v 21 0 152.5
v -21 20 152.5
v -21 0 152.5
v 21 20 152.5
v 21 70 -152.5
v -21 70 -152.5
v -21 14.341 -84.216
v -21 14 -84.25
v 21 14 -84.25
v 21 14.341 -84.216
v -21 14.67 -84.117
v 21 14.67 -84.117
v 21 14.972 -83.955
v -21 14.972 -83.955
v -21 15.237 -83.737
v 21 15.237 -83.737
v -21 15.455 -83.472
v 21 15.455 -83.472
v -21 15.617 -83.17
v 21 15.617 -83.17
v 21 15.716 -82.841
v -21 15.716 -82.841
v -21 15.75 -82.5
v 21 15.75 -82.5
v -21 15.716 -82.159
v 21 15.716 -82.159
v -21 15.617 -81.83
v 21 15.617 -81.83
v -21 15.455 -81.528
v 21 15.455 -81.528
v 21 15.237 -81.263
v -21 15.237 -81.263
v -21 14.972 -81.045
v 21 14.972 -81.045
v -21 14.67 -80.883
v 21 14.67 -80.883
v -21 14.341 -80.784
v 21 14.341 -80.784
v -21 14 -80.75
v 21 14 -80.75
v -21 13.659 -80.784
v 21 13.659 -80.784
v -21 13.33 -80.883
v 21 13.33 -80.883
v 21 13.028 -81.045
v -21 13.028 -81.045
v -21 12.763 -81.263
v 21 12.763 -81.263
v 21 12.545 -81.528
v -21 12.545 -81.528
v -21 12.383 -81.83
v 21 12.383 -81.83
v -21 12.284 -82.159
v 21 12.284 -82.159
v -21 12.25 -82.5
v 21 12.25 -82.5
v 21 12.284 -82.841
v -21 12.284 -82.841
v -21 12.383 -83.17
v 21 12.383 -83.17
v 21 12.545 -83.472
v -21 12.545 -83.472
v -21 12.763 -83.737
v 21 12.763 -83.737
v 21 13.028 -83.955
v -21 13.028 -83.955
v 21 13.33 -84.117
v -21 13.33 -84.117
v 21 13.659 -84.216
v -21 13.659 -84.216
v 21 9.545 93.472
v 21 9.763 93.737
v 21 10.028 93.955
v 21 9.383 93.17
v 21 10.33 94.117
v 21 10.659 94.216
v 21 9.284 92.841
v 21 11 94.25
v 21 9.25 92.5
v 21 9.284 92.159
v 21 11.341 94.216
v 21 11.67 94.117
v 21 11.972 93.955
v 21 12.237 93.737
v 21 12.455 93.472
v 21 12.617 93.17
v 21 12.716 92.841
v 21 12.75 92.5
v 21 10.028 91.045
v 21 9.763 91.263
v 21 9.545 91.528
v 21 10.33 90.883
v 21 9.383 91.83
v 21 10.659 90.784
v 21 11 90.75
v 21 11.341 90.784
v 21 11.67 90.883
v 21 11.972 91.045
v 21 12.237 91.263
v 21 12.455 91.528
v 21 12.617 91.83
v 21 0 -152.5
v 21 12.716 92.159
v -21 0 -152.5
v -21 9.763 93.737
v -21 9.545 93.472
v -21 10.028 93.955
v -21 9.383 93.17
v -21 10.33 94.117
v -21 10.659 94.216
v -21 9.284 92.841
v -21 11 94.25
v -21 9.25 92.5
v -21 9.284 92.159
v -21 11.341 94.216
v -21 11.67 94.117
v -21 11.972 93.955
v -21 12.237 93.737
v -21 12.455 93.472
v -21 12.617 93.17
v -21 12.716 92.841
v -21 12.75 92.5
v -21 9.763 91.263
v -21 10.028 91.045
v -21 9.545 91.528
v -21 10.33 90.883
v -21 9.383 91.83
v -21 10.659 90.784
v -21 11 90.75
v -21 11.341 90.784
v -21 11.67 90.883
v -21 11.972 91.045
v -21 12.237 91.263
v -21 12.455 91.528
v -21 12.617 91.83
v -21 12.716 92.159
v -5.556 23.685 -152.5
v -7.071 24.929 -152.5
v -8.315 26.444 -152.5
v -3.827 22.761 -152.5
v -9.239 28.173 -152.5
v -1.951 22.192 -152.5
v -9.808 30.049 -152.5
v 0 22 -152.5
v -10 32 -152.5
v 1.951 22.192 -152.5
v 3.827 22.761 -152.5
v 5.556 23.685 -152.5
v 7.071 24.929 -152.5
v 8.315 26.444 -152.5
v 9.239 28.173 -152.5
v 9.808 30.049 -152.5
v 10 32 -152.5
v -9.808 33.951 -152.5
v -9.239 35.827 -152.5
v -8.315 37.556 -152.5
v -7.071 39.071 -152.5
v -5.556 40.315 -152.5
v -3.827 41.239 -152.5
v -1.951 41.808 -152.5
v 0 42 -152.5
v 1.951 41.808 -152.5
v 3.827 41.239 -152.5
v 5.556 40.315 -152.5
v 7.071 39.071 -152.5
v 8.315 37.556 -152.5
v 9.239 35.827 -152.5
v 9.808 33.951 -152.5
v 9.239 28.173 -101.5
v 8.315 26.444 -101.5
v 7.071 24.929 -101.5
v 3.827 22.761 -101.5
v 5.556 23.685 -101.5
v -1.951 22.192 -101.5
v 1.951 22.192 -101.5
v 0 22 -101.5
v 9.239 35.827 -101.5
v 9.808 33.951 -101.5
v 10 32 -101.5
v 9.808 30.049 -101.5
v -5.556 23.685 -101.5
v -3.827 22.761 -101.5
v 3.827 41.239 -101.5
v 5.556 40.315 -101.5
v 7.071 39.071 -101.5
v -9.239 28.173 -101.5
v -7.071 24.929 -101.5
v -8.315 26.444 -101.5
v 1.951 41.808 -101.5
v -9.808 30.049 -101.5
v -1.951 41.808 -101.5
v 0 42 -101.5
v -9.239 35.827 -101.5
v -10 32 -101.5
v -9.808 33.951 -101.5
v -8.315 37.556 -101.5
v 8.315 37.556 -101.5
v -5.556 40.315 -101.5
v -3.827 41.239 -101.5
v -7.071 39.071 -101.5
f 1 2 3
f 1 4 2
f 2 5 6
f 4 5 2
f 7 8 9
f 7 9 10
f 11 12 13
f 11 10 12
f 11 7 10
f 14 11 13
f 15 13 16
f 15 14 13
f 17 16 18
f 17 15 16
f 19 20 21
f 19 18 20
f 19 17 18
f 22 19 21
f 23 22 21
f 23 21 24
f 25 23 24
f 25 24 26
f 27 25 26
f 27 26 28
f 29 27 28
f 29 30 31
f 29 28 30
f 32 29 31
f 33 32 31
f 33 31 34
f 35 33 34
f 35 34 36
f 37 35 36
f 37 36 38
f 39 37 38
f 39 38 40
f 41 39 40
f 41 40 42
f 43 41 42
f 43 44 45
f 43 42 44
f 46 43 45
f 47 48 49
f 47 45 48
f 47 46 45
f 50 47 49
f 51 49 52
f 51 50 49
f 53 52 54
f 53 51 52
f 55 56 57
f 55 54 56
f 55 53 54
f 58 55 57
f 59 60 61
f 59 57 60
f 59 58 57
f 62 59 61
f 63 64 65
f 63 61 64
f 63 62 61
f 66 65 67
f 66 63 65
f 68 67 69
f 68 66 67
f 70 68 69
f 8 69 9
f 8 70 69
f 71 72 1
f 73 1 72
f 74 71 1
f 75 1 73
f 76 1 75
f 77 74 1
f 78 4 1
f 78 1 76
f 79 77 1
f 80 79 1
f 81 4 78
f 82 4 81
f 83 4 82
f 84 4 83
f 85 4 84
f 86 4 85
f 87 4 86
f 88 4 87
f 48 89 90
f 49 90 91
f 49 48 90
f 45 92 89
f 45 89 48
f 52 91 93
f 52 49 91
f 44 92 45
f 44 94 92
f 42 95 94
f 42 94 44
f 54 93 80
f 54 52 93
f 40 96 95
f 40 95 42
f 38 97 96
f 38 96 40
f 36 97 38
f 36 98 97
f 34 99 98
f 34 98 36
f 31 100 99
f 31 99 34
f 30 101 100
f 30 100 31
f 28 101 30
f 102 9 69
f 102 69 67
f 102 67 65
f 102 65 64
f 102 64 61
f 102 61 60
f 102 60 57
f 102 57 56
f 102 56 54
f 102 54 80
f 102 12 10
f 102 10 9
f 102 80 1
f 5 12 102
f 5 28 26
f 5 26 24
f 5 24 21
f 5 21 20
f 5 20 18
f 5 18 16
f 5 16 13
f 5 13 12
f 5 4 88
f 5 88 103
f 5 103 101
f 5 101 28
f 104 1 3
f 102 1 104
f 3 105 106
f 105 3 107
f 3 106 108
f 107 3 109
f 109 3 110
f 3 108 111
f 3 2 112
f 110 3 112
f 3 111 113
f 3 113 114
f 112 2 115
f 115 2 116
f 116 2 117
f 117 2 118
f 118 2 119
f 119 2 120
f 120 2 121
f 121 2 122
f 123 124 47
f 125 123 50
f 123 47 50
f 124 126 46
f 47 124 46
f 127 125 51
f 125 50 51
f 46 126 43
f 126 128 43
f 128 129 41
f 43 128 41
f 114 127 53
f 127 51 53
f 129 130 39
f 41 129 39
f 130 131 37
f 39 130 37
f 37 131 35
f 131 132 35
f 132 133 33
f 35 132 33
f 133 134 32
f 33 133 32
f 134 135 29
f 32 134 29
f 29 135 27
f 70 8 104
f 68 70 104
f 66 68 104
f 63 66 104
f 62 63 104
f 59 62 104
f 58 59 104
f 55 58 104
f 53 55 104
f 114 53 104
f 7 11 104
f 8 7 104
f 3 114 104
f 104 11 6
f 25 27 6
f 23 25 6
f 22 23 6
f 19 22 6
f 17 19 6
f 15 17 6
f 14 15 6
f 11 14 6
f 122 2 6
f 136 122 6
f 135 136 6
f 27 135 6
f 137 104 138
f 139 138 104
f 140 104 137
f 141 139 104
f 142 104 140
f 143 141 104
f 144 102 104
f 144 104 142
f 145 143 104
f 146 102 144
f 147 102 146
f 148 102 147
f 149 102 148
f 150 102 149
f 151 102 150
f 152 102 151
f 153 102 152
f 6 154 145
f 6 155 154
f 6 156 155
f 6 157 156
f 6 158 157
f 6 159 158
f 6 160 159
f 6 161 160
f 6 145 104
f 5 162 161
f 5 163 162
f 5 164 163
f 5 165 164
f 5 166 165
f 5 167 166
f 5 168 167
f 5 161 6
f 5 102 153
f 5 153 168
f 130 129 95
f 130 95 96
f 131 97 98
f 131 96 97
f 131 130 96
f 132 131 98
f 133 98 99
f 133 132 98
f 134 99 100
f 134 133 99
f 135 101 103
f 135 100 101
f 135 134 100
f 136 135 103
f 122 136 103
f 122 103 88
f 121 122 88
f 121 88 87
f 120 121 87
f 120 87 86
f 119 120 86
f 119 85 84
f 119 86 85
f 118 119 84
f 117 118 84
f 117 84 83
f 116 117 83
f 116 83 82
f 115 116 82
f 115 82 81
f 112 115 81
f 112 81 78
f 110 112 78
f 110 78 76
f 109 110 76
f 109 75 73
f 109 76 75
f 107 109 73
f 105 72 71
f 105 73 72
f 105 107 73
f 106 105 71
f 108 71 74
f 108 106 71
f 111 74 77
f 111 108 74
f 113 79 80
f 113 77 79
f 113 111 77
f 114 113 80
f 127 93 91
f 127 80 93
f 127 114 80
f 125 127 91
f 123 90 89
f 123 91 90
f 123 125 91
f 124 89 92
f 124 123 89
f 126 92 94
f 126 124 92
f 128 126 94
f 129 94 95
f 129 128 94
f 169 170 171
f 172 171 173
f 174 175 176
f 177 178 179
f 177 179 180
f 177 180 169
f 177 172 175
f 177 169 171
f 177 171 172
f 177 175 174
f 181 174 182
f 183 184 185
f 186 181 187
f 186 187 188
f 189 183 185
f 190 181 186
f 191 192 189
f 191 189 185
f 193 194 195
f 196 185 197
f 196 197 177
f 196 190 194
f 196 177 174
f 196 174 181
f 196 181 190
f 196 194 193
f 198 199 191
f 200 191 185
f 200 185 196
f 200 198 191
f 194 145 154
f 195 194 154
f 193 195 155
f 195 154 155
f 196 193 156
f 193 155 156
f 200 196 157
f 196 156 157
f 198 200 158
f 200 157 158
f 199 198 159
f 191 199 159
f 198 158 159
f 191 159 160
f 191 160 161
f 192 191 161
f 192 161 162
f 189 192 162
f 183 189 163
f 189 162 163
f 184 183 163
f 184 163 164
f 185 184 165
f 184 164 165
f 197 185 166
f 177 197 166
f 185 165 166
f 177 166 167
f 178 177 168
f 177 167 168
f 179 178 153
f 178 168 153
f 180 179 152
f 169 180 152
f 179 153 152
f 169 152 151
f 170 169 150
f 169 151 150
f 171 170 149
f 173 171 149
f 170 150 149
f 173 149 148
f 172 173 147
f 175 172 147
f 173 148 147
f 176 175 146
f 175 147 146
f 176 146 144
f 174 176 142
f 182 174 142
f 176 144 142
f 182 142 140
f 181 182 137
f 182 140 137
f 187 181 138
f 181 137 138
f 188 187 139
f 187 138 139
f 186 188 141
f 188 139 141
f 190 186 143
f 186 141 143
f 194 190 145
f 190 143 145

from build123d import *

# Parameters (mm, degrees)
STOCK_MATERIAL_DEPTH      = 21
SKETCH2_R                 = 10
POWER_PLANT_CHAMBER_DEPTH = 51
AXLE_CUTOUTS_DEPTH        = 170.107214512
AXLE_CUTOUTS_DEPTH_BACK   = 170.107214512
AXLE_LAYOUT_SKETCH_R      = 1.75


with BuildPart() as part:
    # Sketch1 → Stock Material (new, symmetric)
    with BuildSketch(Plane(origin=(0, 0, 0), x_dir=(0, 0, -1), z_dir=(1, 0, 0))):
        Polygon((-152.5, 0), (152.5, 0), (152.5, 70), (-152.5, 20), align=None)
    extrude(amount=STOCK_MATERIAL_DEPTH, both=True)

    # Sketch2 → Power Plant Chamber (cut)
    with BuildSketch(Plane(origin=(0, 0, -152.5), x_dir=(-1, 0, 0), z_dir=(0, 0, -1))):
        with Locations((0, 32)):
            Circle(SKETCH2_R)
    extrude(amount=-POWER_PLANT_CHAMBER_DEPTH, mode=Mode.SUBTRACT)

    # Axle Layout Sketch → Axle Cutouts (cut, two sides: drawn at the far end of the back side and taken through both)
    with BuildSketch(Plane(origin=(0, 0, 0), x_dir=(0, 0, -1), z_dir=(1, 0, 0)).offset(-AXLE_CUTOUTS_DEPTH_BACK)):
        with Locations((-92.5, 11)):
            Circle(AXLE_LAYOUT_SKETCH_R)
        with Locations((82.5, 14)):
            Circle(AXLE_LAYOUT_SKETCH_R)
    extrude(amount=AXLE_CUTOUTS_DEPTH + AXLE_CUTOUTS_DEPTH_BACK, mode=Mode.SUBTRACT)


solid = part.part
